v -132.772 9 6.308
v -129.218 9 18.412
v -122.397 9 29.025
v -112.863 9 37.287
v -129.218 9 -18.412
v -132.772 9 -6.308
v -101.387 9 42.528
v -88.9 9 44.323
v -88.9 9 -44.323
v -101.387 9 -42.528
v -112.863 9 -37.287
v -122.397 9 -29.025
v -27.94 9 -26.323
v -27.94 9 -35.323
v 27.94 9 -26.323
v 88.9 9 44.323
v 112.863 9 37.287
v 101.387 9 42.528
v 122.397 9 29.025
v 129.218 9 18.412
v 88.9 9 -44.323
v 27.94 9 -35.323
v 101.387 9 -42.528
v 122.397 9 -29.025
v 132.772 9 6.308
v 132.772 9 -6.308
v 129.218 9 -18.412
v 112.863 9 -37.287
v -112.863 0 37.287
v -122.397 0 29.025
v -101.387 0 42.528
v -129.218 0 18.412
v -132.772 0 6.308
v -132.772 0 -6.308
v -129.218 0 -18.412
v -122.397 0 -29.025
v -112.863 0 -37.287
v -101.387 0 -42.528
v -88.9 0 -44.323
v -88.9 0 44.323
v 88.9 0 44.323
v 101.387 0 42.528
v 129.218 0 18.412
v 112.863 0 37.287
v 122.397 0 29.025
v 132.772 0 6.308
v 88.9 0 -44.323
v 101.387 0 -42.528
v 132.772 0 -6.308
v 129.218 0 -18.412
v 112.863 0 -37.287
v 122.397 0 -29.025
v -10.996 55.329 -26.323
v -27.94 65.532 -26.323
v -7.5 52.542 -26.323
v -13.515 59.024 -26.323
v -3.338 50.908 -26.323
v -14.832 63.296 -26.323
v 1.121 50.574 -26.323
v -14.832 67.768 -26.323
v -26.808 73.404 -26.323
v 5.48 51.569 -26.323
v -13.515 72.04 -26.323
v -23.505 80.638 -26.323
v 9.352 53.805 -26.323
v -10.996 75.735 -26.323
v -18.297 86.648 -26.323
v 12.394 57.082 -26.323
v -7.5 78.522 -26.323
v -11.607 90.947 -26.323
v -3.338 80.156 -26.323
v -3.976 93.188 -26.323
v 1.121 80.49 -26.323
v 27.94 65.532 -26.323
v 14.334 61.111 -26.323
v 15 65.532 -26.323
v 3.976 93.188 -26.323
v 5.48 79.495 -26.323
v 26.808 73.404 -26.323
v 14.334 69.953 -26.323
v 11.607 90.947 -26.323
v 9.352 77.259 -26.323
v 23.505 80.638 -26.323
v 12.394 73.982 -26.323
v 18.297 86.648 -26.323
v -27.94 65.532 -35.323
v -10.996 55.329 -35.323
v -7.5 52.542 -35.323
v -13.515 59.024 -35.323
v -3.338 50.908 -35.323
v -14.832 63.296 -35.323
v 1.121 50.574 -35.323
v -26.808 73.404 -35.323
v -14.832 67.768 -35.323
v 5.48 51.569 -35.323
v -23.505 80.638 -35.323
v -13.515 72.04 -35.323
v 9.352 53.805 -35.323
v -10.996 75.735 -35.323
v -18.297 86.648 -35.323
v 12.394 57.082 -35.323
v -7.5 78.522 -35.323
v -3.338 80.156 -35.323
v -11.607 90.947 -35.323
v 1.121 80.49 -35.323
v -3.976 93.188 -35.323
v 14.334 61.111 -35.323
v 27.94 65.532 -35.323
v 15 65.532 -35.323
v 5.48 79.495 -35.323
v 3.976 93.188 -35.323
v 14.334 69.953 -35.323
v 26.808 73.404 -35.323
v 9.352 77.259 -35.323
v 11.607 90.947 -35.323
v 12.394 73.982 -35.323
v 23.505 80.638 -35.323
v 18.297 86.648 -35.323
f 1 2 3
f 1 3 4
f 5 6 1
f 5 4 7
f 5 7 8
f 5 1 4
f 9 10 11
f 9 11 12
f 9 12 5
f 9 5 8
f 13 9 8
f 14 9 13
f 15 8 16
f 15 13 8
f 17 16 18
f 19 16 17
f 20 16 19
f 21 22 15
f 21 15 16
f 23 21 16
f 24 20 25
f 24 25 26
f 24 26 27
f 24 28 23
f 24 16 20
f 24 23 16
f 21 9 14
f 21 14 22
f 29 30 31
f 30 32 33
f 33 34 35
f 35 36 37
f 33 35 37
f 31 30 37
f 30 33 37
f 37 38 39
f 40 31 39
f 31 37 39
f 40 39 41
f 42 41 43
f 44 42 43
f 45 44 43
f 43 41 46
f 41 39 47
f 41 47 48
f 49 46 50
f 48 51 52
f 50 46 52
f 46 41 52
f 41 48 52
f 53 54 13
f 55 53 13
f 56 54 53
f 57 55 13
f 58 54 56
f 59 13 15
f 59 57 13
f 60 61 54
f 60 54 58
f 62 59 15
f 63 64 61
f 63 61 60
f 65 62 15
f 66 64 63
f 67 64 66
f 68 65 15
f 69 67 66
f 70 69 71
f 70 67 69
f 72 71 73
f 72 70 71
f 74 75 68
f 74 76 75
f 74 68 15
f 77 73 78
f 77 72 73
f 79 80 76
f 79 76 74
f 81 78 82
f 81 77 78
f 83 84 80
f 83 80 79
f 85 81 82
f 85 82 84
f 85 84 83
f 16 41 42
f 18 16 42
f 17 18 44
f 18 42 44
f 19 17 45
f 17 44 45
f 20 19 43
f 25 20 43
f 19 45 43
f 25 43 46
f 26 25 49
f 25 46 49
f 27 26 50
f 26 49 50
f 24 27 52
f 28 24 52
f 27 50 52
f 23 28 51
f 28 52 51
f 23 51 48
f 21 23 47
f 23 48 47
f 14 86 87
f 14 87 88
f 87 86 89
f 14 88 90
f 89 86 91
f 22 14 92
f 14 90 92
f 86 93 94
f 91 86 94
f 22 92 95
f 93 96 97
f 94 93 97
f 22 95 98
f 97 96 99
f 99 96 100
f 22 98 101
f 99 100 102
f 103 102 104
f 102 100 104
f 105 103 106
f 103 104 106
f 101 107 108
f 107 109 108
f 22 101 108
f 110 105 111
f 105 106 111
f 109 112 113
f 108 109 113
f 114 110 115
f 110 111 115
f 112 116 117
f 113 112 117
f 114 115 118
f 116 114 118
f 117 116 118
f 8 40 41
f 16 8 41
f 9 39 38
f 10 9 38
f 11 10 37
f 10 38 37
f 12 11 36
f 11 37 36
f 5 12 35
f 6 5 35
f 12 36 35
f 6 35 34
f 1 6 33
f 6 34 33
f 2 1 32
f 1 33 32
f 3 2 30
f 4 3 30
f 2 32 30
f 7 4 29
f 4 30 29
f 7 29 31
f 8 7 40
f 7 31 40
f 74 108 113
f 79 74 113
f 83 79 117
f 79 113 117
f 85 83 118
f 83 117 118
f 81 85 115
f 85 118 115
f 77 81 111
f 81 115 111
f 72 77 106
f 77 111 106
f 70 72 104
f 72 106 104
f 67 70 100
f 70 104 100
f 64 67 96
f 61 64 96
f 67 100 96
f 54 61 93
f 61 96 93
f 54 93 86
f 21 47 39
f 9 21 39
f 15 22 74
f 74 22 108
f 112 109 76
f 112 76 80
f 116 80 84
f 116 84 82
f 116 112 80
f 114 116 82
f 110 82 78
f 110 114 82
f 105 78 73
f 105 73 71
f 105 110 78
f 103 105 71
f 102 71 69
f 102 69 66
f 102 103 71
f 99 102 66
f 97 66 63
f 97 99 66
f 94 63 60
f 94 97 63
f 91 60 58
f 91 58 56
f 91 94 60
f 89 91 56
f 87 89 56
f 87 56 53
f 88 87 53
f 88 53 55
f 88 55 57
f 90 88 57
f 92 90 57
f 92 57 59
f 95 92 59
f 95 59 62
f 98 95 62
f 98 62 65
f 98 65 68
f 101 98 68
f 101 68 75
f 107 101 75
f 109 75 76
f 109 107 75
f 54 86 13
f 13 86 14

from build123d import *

# Parameters (mm, degrees)
SKETCH1_W           = 55.88
SKETCH1_H           = 9
BOSS_EXTRUDE1_DEPTH = 9
SKETCH2_R           = 15
BOSS_EXTRUDE2_DEPTH = 9


with BuildPart() as part:
    # Sketch1 → Boss-Extrude1 (new body)
    with BuildSketch(Plane(origin=(0, 0, 0), x_dir=(1, 0, 0), z_dir=(0, 1, 0))):
        with BuildLine():
            Line((-88.9, -44.323), (88.9, -44.323))
            ThreePointArc((88.9, -44.323), (133.223, 0), (88.9, 44.323))
            Line((88.9, 44.323), (-88.9, 44.323))
            ThreePointArc((-88.9, 44.323), (-133.223, 0), (-88.9, -44.323))
        make_face()
        with Locations((0, 30.823)):
            Rectangle(SKETCH1_W, SKETCH1_H, mode=Mode.SUBTRACT)
    extrude(amount=BOSS_EXTRUDE1_DEPTH)

    # Sketch2 → Boss-Extrude2 (add)
    with BuildSketch(Plane.XY.offset(-35.323)):
        with BuildLine():
            Line((-27.94, 0), (27.94, 0))
            Line((27.94, 0), (27.94, 65.532))
            ThreePointArc((27.94, 65.532), (0, 93.472), (-27.94, 65.532))
            Line((-27.94, 65.532), (-27.94, 0))
        make_face()
        with Locations((0, 65.532)):
            Circle(SKETCH2_R, mode=Mode.SUBTRACT)
    extrude(amount=BOSS_EXTRUDE2_DEPTH)


solid = part.part
